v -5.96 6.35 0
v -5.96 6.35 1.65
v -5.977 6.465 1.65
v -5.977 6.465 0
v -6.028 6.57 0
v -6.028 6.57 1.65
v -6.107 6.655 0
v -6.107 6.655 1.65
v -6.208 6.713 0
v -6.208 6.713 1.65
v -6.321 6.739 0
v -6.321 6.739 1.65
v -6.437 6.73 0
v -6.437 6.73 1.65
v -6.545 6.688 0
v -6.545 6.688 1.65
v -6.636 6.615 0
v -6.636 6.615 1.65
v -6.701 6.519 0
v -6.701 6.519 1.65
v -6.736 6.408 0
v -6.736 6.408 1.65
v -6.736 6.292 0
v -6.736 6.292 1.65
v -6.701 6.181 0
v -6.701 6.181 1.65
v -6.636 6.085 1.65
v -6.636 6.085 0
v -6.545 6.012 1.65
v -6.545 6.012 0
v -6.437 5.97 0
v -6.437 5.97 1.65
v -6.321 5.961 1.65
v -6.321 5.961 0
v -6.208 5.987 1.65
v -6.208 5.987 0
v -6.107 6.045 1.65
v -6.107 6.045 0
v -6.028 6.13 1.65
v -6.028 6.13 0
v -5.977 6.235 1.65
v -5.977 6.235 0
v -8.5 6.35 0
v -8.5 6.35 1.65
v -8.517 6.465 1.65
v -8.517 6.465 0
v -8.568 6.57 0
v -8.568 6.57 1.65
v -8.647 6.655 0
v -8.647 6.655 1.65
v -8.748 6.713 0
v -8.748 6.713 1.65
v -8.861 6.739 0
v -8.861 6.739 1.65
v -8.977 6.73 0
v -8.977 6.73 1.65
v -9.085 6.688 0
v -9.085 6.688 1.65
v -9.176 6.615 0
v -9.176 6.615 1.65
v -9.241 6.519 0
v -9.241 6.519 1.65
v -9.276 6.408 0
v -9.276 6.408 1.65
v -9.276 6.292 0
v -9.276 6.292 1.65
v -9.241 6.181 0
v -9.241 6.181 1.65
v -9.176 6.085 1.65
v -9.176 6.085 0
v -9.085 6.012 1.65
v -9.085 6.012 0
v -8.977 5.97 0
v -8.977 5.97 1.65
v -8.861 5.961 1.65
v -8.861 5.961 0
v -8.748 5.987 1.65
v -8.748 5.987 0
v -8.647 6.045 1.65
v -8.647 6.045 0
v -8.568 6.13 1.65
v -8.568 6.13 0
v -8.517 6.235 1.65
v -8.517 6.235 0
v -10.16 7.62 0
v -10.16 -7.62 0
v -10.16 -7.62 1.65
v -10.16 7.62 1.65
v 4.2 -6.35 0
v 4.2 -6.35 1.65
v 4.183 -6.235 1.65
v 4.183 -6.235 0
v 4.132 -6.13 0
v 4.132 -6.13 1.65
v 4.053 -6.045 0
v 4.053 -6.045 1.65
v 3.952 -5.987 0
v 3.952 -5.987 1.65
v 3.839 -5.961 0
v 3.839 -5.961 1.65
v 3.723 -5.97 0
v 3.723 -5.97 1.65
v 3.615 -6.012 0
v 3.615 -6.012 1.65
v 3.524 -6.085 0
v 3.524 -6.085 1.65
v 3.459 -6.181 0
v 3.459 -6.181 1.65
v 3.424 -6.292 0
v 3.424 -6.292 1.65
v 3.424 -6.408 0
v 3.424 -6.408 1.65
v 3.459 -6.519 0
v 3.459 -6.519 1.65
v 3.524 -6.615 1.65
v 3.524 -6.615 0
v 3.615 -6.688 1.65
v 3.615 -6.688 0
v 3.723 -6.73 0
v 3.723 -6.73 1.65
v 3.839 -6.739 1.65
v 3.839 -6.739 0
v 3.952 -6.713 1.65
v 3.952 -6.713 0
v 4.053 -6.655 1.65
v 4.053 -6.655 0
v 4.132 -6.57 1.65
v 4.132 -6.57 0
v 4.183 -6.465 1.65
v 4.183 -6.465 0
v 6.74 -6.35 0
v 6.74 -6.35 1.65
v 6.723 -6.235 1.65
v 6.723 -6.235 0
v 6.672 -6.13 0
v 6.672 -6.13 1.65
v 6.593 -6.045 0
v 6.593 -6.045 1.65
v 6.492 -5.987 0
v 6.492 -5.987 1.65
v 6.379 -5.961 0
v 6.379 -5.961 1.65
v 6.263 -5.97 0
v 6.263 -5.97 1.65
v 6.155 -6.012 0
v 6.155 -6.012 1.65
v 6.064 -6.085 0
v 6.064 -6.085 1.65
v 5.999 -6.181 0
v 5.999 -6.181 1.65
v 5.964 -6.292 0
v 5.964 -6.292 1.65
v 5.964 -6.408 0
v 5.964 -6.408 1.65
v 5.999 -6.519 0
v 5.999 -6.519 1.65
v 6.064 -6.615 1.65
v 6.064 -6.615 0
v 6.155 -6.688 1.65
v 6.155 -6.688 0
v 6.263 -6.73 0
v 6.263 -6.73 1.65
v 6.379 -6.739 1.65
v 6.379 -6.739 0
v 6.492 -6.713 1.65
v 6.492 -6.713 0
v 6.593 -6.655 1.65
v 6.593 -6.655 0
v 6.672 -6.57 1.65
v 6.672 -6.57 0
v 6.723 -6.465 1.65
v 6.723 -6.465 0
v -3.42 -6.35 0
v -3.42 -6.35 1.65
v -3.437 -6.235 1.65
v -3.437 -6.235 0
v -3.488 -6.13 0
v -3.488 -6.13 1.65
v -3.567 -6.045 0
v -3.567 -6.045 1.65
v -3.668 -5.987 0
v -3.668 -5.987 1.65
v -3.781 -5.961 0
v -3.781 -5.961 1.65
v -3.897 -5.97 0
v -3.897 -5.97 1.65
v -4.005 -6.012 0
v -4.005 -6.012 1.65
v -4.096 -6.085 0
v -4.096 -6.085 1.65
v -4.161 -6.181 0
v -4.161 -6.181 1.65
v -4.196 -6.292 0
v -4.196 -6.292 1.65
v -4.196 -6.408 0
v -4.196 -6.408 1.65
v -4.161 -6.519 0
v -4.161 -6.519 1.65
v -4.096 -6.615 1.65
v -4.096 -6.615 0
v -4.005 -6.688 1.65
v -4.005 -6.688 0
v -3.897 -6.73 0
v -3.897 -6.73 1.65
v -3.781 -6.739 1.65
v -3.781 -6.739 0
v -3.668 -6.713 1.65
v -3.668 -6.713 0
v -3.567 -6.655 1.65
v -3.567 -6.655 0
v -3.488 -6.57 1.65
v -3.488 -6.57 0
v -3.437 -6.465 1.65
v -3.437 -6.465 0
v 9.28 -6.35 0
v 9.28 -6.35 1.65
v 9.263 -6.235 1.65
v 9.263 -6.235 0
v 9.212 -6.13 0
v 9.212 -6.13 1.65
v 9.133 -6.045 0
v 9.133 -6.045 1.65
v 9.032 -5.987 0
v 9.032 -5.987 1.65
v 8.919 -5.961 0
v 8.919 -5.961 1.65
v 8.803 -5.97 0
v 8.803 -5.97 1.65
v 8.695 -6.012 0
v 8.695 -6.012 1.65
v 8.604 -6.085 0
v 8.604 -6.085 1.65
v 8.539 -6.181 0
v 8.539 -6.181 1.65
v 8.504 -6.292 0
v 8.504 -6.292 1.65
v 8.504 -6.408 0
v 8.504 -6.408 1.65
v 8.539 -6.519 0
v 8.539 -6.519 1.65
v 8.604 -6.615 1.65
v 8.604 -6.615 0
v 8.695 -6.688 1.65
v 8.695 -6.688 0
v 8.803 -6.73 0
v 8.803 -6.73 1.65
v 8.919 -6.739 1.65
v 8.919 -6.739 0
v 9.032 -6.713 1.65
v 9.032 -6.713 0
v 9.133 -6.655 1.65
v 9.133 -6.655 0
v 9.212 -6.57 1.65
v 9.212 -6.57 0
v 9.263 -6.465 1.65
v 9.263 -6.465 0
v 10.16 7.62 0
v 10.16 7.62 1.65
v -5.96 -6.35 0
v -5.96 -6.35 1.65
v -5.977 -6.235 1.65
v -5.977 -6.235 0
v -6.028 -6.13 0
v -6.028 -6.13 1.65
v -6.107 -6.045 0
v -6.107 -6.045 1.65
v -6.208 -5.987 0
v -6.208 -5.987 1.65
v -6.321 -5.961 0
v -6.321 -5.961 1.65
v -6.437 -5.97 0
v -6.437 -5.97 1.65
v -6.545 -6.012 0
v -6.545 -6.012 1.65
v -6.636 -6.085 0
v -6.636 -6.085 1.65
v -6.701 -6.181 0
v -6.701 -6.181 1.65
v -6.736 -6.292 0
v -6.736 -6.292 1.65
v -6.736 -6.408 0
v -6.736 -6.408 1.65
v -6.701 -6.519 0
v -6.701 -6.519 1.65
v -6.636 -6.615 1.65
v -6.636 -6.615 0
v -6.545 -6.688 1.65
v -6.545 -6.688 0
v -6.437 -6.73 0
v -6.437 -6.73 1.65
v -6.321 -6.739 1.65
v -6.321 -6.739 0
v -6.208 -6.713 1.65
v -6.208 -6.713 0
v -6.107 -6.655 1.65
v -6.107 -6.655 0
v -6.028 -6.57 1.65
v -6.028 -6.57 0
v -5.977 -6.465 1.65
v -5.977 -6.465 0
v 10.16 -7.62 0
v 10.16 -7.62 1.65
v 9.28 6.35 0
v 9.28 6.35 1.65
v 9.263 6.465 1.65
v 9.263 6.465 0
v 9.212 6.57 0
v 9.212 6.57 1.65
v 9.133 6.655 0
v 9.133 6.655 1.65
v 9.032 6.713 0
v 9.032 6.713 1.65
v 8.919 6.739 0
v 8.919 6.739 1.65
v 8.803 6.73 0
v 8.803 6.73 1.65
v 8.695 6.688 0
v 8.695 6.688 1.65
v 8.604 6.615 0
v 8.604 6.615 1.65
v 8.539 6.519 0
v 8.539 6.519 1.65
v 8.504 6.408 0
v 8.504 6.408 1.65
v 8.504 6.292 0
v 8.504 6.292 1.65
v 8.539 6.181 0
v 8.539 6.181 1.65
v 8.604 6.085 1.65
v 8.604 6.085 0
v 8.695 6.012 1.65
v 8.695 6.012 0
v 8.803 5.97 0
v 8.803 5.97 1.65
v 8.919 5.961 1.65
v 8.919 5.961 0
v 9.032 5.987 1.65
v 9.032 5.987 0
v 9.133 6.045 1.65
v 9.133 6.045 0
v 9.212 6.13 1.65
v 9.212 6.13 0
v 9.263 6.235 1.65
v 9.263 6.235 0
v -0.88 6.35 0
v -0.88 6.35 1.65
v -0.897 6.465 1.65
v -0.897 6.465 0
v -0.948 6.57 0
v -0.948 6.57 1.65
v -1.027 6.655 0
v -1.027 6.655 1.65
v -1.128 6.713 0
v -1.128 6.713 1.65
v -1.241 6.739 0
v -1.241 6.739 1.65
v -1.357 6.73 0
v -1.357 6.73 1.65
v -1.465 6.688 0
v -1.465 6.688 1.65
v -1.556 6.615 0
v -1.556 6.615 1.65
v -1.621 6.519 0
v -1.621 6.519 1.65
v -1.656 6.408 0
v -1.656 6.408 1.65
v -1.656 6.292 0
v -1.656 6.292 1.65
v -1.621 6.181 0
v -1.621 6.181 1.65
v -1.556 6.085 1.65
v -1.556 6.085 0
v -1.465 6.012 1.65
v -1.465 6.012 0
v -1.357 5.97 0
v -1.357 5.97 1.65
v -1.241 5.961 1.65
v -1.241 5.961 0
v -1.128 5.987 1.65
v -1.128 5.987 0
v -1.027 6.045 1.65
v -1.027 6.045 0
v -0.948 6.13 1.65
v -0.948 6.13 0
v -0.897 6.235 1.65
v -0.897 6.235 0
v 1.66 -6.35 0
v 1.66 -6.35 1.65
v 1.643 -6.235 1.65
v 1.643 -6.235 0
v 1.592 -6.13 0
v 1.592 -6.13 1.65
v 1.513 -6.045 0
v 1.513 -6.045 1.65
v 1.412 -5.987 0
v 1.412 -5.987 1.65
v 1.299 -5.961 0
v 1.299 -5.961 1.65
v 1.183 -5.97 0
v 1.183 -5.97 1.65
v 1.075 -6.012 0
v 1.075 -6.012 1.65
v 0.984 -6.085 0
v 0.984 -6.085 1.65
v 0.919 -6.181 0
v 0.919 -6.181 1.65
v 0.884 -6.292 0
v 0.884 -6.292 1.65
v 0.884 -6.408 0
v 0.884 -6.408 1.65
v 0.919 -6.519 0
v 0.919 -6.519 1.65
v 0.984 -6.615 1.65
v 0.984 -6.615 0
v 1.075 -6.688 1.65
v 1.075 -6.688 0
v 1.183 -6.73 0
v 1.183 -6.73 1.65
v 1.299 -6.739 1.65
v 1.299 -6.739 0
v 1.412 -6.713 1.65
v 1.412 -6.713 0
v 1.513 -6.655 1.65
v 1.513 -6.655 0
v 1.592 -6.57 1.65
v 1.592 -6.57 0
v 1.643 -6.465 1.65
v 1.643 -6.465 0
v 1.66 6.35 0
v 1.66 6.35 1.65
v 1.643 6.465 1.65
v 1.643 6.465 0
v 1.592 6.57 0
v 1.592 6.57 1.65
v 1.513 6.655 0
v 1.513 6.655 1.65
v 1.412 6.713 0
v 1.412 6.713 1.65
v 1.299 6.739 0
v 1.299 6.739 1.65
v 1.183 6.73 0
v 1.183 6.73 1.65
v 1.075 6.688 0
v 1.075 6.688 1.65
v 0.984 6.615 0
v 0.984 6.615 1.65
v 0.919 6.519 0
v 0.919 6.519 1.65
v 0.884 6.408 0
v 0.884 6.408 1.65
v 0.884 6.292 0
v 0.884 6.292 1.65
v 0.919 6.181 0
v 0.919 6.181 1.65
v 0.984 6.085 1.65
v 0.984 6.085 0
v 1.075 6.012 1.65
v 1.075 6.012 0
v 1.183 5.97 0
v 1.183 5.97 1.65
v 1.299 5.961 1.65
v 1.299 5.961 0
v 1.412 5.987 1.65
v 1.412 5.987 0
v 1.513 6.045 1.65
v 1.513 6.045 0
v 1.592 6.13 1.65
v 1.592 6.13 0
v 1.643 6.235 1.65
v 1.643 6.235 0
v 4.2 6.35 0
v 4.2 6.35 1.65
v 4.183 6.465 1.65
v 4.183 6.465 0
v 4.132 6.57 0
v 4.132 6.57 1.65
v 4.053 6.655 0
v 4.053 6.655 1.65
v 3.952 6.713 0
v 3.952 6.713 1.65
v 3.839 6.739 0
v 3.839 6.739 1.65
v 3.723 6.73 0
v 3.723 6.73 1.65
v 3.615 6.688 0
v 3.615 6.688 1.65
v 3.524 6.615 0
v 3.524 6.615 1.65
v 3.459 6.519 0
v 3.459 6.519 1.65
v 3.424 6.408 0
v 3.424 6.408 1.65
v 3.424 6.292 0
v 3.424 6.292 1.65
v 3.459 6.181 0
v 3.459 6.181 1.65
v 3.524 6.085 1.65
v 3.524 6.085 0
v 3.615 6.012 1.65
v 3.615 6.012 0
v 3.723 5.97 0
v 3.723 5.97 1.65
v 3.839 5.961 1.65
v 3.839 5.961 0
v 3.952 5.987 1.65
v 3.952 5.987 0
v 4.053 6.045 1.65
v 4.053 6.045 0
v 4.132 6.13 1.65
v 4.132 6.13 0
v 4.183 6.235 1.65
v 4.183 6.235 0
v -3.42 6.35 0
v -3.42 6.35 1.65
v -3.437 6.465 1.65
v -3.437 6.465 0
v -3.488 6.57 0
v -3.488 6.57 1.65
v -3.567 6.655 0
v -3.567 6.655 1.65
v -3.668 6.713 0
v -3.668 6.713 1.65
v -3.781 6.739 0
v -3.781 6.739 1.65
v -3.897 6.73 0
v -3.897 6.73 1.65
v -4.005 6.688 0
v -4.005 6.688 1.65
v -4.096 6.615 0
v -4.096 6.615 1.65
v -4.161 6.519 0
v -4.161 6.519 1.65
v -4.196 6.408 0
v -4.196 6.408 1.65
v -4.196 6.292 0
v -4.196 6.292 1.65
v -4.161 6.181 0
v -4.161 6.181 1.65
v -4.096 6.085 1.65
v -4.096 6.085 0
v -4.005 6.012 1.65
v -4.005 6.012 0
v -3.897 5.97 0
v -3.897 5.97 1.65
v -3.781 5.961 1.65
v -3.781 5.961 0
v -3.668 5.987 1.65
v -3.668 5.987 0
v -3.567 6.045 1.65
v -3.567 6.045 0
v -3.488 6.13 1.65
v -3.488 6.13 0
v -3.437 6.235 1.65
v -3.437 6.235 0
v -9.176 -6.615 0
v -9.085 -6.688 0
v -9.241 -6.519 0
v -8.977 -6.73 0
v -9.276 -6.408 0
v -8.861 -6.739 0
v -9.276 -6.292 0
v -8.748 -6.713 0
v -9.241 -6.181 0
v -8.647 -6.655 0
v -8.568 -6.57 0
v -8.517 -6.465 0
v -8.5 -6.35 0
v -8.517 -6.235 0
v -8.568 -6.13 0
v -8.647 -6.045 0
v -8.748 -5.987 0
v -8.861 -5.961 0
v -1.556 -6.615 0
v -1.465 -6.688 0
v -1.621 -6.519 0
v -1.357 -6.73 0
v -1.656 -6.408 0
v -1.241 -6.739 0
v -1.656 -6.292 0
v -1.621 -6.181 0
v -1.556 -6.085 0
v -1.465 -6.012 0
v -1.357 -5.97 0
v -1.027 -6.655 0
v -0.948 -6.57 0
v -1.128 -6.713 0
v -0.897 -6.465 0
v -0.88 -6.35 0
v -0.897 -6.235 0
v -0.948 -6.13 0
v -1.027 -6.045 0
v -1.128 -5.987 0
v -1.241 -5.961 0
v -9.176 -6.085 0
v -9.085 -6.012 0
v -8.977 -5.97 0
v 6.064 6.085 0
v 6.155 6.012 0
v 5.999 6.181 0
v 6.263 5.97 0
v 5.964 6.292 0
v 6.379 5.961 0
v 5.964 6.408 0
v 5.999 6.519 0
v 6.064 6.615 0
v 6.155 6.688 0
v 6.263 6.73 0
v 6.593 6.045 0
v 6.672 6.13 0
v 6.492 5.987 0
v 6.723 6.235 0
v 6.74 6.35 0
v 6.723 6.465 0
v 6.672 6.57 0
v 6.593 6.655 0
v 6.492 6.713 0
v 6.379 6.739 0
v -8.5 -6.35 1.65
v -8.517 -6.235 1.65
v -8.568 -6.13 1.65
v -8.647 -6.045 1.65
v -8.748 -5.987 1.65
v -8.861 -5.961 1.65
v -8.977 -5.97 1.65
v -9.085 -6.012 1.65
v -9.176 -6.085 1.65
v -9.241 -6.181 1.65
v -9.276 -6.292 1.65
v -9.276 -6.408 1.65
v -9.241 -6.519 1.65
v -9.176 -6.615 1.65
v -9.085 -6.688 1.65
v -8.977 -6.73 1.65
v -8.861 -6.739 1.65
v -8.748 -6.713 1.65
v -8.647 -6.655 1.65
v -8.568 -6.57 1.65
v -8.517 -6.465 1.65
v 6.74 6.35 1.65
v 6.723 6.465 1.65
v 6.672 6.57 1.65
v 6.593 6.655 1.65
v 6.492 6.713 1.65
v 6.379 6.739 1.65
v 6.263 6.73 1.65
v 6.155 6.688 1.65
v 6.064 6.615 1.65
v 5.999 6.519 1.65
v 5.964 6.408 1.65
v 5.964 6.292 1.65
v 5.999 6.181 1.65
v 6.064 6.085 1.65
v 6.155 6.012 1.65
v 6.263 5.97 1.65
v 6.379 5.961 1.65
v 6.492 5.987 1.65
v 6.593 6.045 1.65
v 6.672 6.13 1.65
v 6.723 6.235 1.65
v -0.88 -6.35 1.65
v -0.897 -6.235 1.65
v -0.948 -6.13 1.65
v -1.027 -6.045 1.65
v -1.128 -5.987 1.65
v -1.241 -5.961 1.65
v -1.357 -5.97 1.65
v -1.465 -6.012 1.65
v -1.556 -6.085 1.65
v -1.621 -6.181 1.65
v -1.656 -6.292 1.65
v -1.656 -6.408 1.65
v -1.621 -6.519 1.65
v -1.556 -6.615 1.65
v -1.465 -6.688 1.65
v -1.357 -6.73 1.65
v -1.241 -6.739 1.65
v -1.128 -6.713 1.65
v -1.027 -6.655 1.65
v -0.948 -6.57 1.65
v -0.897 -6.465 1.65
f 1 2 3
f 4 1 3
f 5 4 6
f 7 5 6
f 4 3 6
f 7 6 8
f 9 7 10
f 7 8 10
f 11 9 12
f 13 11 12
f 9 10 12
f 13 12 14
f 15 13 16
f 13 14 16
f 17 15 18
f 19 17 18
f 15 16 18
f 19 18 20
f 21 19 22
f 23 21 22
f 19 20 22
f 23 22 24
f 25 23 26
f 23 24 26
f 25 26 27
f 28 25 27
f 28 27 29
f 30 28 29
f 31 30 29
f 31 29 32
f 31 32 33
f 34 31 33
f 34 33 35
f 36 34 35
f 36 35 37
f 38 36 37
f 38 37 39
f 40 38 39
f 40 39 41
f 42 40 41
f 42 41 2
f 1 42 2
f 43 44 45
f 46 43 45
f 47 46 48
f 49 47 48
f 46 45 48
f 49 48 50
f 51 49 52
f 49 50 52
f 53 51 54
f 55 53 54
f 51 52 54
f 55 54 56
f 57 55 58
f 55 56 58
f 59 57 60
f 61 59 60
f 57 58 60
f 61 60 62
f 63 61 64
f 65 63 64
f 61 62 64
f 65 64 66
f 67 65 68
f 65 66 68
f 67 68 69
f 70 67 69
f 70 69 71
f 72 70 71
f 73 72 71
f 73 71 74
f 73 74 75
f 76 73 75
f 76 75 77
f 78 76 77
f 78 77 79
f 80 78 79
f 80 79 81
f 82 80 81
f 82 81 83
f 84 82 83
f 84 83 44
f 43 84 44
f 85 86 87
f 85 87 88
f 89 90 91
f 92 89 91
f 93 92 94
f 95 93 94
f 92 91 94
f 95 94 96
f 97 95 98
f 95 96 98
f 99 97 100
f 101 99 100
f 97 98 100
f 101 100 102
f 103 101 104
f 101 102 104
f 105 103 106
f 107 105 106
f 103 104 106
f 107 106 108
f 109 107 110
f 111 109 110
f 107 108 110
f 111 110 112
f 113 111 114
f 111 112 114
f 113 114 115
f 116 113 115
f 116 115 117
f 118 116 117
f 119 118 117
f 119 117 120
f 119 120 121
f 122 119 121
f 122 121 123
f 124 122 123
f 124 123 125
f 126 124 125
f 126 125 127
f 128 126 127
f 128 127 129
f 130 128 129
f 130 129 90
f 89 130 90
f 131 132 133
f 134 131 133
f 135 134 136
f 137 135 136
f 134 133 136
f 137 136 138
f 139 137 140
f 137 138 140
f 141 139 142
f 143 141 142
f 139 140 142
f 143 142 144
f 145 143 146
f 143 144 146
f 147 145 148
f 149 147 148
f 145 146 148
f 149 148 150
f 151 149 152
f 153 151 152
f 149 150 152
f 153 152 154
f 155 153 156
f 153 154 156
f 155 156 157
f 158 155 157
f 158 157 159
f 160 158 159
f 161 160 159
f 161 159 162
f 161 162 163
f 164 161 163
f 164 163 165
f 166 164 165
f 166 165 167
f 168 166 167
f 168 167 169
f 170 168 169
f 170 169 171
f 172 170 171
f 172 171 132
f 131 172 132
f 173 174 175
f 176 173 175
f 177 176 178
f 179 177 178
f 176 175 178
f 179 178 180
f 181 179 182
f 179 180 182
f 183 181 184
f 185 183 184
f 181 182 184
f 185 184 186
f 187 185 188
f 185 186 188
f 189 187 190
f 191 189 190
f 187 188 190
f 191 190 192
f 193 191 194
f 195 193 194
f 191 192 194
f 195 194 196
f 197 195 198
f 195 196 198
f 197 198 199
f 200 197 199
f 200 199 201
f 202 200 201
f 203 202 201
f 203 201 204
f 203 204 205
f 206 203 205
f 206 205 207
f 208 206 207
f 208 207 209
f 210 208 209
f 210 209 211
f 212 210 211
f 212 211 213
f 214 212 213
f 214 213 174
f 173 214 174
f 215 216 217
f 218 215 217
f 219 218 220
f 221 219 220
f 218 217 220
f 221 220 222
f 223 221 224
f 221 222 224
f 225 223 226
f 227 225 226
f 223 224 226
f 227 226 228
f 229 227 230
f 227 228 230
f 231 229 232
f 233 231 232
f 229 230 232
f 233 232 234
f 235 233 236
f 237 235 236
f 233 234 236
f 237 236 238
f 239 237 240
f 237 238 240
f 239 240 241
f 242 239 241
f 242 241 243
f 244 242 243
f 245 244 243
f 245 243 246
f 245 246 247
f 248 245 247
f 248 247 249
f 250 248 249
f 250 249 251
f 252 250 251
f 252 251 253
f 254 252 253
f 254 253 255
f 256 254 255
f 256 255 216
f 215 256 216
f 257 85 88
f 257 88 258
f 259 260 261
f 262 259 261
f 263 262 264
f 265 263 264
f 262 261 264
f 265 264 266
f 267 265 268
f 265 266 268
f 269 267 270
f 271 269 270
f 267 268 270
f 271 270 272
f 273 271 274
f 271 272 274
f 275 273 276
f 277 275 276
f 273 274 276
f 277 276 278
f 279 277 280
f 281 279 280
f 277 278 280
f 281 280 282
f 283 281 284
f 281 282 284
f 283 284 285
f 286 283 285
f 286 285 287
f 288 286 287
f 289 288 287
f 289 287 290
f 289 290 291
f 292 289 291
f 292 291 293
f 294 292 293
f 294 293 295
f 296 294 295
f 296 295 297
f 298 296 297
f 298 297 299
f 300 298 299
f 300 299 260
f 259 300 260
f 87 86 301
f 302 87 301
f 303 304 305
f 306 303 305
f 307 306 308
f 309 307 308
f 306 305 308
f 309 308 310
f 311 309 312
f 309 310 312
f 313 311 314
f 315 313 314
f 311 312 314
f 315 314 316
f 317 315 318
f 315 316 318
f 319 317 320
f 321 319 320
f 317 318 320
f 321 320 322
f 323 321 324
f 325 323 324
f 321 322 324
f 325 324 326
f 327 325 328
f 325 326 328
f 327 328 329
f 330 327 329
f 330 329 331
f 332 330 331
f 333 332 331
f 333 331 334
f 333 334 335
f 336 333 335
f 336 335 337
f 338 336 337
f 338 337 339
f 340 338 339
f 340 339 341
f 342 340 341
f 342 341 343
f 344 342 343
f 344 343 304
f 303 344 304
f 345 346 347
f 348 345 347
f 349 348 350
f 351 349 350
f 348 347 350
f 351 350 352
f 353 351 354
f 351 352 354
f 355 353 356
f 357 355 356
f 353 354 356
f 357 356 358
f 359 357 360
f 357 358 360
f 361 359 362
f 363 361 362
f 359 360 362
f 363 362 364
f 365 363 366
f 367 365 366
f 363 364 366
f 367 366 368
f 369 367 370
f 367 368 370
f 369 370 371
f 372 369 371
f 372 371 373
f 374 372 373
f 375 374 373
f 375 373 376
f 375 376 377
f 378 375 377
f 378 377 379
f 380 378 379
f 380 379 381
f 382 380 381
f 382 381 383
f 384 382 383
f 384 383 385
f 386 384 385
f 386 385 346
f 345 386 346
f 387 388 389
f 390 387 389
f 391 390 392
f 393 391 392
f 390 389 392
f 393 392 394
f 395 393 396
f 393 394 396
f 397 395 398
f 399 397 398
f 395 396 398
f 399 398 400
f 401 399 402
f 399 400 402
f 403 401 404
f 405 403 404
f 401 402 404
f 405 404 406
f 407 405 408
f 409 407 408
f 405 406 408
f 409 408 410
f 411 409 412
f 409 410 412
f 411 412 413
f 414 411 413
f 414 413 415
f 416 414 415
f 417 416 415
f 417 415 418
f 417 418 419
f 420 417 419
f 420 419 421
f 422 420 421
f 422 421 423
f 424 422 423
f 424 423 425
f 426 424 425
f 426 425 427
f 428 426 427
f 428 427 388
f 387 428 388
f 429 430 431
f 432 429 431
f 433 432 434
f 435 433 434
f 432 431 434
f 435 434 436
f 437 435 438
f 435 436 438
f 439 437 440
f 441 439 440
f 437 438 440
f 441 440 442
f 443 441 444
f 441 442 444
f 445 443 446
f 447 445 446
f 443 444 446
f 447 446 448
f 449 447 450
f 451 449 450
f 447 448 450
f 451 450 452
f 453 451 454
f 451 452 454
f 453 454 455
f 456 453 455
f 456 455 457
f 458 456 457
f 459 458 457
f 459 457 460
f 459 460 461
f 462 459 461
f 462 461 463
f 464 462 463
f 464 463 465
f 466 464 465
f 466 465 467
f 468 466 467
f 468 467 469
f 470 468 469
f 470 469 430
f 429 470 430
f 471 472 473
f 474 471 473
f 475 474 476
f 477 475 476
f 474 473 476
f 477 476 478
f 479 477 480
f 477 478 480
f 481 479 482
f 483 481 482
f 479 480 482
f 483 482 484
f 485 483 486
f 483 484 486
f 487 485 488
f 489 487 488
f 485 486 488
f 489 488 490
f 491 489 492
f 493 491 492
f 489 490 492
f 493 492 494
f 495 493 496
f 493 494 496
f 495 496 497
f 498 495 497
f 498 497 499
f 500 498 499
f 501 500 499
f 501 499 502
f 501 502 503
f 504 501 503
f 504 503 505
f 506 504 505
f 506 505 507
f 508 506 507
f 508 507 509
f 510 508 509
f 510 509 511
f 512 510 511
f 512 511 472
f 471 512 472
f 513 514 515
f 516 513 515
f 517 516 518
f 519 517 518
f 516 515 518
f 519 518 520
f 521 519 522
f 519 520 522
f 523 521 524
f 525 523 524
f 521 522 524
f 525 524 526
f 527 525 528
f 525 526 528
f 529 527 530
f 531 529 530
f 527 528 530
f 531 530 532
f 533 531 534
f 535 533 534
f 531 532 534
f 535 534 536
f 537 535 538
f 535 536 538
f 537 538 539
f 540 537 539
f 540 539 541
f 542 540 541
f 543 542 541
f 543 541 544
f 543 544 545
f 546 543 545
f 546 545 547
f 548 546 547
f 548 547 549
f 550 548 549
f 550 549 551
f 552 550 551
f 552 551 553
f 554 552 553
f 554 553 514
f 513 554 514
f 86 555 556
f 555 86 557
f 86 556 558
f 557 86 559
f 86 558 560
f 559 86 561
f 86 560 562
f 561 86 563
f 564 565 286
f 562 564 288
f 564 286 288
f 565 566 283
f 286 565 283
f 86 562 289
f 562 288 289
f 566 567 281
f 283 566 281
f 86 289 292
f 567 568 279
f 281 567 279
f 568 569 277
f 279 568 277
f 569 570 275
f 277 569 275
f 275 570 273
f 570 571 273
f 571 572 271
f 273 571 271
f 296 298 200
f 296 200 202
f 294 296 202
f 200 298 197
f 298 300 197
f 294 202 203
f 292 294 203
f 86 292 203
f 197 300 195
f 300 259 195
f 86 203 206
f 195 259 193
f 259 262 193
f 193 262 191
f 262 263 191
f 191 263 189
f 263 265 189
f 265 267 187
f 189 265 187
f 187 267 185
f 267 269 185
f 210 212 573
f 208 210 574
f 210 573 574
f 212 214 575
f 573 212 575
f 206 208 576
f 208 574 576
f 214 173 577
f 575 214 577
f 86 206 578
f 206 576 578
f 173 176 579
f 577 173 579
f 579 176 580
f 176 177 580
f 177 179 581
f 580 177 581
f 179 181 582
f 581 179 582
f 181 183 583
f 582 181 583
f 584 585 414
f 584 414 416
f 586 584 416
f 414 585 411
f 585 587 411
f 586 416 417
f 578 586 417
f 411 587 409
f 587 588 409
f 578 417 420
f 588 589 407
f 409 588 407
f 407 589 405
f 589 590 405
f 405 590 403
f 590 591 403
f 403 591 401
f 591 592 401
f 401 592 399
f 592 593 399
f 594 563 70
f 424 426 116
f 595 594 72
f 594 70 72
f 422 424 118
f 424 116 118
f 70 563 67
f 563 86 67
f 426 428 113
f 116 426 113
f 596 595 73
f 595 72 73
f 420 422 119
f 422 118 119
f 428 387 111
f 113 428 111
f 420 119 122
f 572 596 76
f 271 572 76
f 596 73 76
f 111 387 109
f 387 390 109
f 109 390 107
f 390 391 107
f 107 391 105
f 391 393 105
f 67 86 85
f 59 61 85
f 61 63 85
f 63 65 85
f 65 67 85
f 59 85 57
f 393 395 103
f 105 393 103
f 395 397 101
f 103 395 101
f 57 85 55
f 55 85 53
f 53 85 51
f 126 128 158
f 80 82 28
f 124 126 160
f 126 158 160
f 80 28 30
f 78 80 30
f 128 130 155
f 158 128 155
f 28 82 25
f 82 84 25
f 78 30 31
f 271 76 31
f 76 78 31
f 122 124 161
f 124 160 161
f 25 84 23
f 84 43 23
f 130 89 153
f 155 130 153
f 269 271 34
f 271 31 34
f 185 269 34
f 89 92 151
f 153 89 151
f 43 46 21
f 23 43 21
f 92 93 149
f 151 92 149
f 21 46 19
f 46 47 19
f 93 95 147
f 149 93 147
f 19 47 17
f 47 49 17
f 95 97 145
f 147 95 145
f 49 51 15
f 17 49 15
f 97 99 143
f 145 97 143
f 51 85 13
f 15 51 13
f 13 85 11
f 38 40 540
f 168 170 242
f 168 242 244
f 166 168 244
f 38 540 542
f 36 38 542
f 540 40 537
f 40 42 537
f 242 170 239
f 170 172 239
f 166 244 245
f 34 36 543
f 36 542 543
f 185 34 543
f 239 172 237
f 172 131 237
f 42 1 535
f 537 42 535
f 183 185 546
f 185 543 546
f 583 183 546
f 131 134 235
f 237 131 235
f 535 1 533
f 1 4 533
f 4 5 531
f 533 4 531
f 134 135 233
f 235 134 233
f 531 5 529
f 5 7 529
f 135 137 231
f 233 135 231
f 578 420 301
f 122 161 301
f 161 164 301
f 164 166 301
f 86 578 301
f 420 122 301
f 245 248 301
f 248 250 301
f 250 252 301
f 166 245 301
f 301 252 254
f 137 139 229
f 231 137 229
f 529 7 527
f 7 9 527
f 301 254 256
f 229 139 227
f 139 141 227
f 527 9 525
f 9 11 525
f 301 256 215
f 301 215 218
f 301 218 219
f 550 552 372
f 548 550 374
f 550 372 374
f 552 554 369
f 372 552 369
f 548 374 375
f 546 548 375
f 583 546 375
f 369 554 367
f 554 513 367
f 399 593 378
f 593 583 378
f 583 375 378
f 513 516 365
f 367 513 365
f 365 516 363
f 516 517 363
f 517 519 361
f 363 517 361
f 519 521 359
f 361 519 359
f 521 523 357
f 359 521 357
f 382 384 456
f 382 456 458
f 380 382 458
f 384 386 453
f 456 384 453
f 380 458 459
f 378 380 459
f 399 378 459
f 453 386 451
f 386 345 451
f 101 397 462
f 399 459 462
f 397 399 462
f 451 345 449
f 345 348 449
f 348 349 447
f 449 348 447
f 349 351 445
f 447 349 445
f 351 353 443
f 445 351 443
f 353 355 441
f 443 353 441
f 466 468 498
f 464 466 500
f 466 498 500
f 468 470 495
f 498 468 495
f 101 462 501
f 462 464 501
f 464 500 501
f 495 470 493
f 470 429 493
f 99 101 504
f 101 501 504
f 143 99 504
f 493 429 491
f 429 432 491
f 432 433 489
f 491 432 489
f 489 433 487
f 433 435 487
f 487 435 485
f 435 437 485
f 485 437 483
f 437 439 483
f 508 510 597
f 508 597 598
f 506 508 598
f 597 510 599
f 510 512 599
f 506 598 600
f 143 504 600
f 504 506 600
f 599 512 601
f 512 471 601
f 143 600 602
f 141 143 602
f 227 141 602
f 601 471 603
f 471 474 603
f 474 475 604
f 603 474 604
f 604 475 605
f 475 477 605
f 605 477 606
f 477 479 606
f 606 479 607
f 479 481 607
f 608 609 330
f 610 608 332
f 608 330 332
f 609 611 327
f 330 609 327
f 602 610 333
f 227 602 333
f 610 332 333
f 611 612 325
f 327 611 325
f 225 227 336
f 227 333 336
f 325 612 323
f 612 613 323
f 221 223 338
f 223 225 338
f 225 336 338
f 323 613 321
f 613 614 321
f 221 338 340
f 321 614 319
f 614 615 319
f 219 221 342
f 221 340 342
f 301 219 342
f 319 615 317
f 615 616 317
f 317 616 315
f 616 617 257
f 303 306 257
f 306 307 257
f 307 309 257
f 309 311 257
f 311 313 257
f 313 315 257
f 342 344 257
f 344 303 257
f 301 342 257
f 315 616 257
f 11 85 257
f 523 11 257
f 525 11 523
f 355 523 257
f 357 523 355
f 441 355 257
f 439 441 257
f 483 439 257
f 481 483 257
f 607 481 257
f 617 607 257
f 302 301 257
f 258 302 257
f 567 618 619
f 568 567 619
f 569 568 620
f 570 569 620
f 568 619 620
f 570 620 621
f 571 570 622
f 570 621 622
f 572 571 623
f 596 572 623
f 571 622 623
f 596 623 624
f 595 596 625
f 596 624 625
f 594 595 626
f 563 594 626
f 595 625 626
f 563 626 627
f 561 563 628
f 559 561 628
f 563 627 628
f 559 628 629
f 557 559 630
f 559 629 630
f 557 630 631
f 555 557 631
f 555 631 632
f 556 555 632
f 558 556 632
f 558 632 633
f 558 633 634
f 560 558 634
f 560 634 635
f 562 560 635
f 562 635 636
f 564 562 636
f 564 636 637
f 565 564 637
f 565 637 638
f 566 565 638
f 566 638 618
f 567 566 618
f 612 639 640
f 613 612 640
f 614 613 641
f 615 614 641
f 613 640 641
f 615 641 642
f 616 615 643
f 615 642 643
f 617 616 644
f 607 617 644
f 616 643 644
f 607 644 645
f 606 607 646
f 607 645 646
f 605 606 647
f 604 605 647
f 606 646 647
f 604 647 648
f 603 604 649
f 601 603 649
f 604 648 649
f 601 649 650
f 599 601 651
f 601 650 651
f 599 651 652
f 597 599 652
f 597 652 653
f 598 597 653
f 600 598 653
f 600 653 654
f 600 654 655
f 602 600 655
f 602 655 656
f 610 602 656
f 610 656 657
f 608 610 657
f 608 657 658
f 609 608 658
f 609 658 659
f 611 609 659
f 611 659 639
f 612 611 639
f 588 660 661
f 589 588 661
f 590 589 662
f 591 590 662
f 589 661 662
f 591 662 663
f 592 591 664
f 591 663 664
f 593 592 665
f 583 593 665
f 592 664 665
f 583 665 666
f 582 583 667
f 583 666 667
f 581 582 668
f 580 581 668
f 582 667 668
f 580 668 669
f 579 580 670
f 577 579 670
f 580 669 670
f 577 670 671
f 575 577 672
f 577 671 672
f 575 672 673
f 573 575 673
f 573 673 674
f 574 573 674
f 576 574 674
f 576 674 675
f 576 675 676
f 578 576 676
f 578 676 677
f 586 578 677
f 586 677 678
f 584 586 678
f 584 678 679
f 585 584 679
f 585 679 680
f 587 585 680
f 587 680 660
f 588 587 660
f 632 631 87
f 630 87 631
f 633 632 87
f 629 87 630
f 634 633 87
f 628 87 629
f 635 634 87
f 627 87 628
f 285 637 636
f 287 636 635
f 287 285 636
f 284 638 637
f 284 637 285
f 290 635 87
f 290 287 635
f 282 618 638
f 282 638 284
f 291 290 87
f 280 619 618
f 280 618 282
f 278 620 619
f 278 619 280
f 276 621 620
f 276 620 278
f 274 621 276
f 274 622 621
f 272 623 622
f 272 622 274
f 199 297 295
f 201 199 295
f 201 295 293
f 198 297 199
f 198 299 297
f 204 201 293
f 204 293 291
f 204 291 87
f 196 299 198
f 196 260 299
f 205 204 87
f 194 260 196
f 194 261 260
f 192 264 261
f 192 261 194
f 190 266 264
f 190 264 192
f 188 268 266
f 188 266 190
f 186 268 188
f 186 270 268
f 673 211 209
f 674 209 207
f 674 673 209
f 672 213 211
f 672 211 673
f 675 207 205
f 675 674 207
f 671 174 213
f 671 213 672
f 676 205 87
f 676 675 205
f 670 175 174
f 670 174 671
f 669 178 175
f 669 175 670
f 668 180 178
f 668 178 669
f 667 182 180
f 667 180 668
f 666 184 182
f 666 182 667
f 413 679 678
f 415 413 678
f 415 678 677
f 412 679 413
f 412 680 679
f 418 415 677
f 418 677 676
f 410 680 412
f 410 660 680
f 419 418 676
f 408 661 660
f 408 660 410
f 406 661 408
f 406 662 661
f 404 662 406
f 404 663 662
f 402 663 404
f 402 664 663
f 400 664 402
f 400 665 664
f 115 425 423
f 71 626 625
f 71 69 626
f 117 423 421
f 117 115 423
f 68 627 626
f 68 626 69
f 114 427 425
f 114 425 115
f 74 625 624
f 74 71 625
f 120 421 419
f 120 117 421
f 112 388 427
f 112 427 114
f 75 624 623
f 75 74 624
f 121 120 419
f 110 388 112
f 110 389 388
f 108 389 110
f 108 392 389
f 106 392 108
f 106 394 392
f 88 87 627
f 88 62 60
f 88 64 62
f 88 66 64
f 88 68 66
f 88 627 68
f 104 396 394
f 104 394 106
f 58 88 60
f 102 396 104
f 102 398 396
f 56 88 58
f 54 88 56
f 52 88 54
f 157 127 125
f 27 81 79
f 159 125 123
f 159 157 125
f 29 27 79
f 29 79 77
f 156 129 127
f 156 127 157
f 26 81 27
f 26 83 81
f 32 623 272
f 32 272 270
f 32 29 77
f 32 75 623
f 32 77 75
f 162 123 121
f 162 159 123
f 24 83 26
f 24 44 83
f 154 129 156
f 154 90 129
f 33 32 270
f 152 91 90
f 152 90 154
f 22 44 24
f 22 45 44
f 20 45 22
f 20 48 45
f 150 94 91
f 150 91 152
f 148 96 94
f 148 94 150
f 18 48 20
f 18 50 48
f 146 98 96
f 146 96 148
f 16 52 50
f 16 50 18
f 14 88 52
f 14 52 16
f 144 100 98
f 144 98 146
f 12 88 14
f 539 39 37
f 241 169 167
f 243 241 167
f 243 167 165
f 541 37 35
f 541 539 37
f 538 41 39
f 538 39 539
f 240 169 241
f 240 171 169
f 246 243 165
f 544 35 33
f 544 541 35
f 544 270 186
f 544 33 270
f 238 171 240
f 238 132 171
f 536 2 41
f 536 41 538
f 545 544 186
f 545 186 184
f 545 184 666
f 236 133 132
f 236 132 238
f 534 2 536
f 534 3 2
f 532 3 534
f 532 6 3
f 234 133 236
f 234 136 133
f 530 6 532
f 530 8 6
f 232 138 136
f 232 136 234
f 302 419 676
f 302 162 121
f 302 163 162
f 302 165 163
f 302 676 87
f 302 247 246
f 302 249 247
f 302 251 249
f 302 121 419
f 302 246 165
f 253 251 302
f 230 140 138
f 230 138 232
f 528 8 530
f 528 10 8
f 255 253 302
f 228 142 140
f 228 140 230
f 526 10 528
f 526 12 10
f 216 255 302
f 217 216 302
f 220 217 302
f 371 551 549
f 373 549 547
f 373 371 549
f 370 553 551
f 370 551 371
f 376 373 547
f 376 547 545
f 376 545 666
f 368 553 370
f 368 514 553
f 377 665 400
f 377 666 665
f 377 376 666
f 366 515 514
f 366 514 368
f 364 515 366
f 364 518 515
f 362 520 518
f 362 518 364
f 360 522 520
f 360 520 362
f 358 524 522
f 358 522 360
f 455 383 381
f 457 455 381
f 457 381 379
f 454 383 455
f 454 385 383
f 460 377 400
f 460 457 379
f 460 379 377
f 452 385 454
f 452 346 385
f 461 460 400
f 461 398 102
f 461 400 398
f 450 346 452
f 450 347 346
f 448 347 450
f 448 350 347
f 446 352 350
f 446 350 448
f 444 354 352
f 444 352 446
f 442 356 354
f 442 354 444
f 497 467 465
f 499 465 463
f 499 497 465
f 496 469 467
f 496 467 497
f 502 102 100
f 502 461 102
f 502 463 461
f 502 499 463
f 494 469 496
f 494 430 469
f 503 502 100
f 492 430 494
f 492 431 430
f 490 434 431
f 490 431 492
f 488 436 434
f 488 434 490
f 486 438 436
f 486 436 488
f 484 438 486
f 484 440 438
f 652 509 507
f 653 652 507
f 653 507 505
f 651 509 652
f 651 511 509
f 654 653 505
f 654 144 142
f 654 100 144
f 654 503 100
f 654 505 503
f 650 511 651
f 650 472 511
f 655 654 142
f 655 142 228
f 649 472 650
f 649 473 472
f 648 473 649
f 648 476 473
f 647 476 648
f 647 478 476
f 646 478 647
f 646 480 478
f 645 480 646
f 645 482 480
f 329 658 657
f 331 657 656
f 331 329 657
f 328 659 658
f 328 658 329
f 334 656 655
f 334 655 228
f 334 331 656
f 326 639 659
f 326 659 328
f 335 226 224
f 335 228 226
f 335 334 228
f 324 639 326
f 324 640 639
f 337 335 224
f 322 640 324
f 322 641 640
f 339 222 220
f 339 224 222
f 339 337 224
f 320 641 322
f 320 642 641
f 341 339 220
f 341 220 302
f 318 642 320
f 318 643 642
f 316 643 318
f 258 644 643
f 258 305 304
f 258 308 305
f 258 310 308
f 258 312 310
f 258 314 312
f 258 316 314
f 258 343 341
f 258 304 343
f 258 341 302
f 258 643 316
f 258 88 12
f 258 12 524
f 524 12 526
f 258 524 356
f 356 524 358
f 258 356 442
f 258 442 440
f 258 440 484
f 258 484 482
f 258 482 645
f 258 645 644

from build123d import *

# Parameters (mm, degrees)
SKETCH047_W              = 20.32
SKETCH047_H              = 15.24
PAD001010_DEPTH          = 1.65
SKETCH048_R              = 0.39
POCKET021005005004_DEPTH = 1.651
LINEARPATTERN002_COUNT   = 8
LINEARPATTERN002_PITCH   = 2.54


with BuildPart() as part:
    # Sketch047 → Pad001010 (new body)
    with BuildSketch(Plane.XY):
        Rectangle(SKETCH047_W, SKETCH047_H)
    extrude(amount=PAD001010_DEPTH)

    # Sketch048 (on Face6 of Pad001010) → Pocket021005005004 (cut, through all)
    with BuildSketch(Plane.XY.offset(1.65)):
        with Locations((-8.89, -6.35)):
            Circle(SKETCH048_R)
        with Locations((-8.89, 6.35)):
            Circle(SKETCH048_R)
    pocket021005005004 = extrude(amount=-POCKET021005005004_DEPTH, mode=Mode.SUBTRACT)

    # LinearPattern002: Pocket021005005004 ×8
    with Locations(*[(i * LINEARPATTERN002_PITCH, 0, 0) for i in range(1, LINEARPATTERN002_COUNT)]):
        add(pocket021005005004, mode=Mode.SUBTRACT)


solid = part.part
